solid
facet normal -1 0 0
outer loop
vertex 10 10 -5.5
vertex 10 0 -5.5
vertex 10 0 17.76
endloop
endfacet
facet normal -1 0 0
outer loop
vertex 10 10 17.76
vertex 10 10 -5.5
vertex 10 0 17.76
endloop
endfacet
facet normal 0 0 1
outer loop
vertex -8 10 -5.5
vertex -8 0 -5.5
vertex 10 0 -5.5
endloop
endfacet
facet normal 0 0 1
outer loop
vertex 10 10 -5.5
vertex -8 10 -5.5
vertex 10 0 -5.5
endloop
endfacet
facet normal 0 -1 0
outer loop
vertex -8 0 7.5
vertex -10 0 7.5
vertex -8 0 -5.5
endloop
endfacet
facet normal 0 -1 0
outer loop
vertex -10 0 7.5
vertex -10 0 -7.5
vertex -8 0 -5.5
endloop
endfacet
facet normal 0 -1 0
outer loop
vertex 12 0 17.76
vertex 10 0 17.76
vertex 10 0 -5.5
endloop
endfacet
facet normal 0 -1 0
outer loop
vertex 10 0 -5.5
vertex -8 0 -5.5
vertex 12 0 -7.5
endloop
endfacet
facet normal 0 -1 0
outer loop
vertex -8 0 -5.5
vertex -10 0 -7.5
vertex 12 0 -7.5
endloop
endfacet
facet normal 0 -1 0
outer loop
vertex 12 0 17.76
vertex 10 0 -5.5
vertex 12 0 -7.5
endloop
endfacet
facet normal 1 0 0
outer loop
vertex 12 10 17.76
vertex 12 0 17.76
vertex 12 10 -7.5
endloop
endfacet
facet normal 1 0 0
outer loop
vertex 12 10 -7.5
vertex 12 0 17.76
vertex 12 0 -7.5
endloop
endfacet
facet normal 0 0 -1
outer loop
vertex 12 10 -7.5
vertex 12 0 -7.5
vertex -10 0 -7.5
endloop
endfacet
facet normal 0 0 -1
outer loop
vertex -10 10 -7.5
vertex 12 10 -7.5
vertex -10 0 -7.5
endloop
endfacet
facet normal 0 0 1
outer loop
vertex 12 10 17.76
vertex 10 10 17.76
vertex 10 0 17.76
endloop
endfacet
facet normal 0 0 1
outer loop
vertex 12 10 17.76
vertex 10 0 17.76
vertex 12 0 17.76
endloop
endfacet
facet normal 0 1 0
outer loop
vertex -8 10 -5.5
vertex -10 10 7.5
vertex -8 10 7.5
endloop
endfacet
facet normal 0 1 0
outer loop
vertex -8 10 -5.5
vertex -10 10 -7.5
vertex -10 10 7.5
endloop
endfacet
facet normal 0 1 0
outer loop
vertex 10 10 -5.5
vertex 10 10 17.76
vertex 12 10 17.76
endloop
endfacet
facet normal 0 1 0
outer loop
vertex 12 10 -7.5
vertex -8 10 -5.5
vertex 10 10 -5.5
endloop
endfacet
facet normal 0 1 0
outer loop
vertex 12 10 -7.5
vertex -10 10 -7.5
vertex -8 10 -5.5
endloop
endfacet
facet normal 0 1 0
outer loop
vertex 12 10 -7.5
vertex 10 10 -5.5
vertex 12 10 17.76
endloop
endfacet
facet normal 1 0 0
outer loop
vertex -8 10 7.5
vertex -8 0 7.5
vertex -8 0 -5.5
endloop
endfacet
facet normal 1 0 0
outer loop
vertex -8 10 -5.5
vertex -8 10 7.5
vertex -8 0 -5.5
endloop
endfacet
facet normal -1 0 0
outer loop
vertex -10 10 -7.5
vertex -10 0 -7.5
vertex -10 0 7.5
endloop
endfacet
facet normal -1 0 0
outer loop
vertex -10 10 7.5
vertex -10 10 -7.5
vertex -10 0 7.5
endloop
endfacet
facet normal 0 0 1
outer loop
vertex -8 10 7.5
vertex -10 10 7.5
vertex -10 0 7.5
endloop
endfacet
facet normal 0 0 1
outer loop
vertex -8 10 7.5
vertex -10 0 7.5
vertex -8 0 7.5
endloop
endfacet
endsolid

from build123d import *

# Parameters (mm, degrees)
EXTRUDE_1_DEPTH = 10


with BuildPart() as part:
    # 草圖1 → 填料-伸長1 (new body)
    with BuildSketch(Plane(origin=(0, 0, 0), x_dir=(1, 0, 0), z_dir=(0, 1, 0))):
        Polygon((-10, -7.5), (-8, -7.5), (-8, 5.5), (10, 5.5), (10, -17.760223048), (12, -17.760223048), (12, 7.5), (10, 7.5), (-10, 7.5), align=None)
    extrude(amount=EXTRUDE_1_DEPTH)


solid = part.part
